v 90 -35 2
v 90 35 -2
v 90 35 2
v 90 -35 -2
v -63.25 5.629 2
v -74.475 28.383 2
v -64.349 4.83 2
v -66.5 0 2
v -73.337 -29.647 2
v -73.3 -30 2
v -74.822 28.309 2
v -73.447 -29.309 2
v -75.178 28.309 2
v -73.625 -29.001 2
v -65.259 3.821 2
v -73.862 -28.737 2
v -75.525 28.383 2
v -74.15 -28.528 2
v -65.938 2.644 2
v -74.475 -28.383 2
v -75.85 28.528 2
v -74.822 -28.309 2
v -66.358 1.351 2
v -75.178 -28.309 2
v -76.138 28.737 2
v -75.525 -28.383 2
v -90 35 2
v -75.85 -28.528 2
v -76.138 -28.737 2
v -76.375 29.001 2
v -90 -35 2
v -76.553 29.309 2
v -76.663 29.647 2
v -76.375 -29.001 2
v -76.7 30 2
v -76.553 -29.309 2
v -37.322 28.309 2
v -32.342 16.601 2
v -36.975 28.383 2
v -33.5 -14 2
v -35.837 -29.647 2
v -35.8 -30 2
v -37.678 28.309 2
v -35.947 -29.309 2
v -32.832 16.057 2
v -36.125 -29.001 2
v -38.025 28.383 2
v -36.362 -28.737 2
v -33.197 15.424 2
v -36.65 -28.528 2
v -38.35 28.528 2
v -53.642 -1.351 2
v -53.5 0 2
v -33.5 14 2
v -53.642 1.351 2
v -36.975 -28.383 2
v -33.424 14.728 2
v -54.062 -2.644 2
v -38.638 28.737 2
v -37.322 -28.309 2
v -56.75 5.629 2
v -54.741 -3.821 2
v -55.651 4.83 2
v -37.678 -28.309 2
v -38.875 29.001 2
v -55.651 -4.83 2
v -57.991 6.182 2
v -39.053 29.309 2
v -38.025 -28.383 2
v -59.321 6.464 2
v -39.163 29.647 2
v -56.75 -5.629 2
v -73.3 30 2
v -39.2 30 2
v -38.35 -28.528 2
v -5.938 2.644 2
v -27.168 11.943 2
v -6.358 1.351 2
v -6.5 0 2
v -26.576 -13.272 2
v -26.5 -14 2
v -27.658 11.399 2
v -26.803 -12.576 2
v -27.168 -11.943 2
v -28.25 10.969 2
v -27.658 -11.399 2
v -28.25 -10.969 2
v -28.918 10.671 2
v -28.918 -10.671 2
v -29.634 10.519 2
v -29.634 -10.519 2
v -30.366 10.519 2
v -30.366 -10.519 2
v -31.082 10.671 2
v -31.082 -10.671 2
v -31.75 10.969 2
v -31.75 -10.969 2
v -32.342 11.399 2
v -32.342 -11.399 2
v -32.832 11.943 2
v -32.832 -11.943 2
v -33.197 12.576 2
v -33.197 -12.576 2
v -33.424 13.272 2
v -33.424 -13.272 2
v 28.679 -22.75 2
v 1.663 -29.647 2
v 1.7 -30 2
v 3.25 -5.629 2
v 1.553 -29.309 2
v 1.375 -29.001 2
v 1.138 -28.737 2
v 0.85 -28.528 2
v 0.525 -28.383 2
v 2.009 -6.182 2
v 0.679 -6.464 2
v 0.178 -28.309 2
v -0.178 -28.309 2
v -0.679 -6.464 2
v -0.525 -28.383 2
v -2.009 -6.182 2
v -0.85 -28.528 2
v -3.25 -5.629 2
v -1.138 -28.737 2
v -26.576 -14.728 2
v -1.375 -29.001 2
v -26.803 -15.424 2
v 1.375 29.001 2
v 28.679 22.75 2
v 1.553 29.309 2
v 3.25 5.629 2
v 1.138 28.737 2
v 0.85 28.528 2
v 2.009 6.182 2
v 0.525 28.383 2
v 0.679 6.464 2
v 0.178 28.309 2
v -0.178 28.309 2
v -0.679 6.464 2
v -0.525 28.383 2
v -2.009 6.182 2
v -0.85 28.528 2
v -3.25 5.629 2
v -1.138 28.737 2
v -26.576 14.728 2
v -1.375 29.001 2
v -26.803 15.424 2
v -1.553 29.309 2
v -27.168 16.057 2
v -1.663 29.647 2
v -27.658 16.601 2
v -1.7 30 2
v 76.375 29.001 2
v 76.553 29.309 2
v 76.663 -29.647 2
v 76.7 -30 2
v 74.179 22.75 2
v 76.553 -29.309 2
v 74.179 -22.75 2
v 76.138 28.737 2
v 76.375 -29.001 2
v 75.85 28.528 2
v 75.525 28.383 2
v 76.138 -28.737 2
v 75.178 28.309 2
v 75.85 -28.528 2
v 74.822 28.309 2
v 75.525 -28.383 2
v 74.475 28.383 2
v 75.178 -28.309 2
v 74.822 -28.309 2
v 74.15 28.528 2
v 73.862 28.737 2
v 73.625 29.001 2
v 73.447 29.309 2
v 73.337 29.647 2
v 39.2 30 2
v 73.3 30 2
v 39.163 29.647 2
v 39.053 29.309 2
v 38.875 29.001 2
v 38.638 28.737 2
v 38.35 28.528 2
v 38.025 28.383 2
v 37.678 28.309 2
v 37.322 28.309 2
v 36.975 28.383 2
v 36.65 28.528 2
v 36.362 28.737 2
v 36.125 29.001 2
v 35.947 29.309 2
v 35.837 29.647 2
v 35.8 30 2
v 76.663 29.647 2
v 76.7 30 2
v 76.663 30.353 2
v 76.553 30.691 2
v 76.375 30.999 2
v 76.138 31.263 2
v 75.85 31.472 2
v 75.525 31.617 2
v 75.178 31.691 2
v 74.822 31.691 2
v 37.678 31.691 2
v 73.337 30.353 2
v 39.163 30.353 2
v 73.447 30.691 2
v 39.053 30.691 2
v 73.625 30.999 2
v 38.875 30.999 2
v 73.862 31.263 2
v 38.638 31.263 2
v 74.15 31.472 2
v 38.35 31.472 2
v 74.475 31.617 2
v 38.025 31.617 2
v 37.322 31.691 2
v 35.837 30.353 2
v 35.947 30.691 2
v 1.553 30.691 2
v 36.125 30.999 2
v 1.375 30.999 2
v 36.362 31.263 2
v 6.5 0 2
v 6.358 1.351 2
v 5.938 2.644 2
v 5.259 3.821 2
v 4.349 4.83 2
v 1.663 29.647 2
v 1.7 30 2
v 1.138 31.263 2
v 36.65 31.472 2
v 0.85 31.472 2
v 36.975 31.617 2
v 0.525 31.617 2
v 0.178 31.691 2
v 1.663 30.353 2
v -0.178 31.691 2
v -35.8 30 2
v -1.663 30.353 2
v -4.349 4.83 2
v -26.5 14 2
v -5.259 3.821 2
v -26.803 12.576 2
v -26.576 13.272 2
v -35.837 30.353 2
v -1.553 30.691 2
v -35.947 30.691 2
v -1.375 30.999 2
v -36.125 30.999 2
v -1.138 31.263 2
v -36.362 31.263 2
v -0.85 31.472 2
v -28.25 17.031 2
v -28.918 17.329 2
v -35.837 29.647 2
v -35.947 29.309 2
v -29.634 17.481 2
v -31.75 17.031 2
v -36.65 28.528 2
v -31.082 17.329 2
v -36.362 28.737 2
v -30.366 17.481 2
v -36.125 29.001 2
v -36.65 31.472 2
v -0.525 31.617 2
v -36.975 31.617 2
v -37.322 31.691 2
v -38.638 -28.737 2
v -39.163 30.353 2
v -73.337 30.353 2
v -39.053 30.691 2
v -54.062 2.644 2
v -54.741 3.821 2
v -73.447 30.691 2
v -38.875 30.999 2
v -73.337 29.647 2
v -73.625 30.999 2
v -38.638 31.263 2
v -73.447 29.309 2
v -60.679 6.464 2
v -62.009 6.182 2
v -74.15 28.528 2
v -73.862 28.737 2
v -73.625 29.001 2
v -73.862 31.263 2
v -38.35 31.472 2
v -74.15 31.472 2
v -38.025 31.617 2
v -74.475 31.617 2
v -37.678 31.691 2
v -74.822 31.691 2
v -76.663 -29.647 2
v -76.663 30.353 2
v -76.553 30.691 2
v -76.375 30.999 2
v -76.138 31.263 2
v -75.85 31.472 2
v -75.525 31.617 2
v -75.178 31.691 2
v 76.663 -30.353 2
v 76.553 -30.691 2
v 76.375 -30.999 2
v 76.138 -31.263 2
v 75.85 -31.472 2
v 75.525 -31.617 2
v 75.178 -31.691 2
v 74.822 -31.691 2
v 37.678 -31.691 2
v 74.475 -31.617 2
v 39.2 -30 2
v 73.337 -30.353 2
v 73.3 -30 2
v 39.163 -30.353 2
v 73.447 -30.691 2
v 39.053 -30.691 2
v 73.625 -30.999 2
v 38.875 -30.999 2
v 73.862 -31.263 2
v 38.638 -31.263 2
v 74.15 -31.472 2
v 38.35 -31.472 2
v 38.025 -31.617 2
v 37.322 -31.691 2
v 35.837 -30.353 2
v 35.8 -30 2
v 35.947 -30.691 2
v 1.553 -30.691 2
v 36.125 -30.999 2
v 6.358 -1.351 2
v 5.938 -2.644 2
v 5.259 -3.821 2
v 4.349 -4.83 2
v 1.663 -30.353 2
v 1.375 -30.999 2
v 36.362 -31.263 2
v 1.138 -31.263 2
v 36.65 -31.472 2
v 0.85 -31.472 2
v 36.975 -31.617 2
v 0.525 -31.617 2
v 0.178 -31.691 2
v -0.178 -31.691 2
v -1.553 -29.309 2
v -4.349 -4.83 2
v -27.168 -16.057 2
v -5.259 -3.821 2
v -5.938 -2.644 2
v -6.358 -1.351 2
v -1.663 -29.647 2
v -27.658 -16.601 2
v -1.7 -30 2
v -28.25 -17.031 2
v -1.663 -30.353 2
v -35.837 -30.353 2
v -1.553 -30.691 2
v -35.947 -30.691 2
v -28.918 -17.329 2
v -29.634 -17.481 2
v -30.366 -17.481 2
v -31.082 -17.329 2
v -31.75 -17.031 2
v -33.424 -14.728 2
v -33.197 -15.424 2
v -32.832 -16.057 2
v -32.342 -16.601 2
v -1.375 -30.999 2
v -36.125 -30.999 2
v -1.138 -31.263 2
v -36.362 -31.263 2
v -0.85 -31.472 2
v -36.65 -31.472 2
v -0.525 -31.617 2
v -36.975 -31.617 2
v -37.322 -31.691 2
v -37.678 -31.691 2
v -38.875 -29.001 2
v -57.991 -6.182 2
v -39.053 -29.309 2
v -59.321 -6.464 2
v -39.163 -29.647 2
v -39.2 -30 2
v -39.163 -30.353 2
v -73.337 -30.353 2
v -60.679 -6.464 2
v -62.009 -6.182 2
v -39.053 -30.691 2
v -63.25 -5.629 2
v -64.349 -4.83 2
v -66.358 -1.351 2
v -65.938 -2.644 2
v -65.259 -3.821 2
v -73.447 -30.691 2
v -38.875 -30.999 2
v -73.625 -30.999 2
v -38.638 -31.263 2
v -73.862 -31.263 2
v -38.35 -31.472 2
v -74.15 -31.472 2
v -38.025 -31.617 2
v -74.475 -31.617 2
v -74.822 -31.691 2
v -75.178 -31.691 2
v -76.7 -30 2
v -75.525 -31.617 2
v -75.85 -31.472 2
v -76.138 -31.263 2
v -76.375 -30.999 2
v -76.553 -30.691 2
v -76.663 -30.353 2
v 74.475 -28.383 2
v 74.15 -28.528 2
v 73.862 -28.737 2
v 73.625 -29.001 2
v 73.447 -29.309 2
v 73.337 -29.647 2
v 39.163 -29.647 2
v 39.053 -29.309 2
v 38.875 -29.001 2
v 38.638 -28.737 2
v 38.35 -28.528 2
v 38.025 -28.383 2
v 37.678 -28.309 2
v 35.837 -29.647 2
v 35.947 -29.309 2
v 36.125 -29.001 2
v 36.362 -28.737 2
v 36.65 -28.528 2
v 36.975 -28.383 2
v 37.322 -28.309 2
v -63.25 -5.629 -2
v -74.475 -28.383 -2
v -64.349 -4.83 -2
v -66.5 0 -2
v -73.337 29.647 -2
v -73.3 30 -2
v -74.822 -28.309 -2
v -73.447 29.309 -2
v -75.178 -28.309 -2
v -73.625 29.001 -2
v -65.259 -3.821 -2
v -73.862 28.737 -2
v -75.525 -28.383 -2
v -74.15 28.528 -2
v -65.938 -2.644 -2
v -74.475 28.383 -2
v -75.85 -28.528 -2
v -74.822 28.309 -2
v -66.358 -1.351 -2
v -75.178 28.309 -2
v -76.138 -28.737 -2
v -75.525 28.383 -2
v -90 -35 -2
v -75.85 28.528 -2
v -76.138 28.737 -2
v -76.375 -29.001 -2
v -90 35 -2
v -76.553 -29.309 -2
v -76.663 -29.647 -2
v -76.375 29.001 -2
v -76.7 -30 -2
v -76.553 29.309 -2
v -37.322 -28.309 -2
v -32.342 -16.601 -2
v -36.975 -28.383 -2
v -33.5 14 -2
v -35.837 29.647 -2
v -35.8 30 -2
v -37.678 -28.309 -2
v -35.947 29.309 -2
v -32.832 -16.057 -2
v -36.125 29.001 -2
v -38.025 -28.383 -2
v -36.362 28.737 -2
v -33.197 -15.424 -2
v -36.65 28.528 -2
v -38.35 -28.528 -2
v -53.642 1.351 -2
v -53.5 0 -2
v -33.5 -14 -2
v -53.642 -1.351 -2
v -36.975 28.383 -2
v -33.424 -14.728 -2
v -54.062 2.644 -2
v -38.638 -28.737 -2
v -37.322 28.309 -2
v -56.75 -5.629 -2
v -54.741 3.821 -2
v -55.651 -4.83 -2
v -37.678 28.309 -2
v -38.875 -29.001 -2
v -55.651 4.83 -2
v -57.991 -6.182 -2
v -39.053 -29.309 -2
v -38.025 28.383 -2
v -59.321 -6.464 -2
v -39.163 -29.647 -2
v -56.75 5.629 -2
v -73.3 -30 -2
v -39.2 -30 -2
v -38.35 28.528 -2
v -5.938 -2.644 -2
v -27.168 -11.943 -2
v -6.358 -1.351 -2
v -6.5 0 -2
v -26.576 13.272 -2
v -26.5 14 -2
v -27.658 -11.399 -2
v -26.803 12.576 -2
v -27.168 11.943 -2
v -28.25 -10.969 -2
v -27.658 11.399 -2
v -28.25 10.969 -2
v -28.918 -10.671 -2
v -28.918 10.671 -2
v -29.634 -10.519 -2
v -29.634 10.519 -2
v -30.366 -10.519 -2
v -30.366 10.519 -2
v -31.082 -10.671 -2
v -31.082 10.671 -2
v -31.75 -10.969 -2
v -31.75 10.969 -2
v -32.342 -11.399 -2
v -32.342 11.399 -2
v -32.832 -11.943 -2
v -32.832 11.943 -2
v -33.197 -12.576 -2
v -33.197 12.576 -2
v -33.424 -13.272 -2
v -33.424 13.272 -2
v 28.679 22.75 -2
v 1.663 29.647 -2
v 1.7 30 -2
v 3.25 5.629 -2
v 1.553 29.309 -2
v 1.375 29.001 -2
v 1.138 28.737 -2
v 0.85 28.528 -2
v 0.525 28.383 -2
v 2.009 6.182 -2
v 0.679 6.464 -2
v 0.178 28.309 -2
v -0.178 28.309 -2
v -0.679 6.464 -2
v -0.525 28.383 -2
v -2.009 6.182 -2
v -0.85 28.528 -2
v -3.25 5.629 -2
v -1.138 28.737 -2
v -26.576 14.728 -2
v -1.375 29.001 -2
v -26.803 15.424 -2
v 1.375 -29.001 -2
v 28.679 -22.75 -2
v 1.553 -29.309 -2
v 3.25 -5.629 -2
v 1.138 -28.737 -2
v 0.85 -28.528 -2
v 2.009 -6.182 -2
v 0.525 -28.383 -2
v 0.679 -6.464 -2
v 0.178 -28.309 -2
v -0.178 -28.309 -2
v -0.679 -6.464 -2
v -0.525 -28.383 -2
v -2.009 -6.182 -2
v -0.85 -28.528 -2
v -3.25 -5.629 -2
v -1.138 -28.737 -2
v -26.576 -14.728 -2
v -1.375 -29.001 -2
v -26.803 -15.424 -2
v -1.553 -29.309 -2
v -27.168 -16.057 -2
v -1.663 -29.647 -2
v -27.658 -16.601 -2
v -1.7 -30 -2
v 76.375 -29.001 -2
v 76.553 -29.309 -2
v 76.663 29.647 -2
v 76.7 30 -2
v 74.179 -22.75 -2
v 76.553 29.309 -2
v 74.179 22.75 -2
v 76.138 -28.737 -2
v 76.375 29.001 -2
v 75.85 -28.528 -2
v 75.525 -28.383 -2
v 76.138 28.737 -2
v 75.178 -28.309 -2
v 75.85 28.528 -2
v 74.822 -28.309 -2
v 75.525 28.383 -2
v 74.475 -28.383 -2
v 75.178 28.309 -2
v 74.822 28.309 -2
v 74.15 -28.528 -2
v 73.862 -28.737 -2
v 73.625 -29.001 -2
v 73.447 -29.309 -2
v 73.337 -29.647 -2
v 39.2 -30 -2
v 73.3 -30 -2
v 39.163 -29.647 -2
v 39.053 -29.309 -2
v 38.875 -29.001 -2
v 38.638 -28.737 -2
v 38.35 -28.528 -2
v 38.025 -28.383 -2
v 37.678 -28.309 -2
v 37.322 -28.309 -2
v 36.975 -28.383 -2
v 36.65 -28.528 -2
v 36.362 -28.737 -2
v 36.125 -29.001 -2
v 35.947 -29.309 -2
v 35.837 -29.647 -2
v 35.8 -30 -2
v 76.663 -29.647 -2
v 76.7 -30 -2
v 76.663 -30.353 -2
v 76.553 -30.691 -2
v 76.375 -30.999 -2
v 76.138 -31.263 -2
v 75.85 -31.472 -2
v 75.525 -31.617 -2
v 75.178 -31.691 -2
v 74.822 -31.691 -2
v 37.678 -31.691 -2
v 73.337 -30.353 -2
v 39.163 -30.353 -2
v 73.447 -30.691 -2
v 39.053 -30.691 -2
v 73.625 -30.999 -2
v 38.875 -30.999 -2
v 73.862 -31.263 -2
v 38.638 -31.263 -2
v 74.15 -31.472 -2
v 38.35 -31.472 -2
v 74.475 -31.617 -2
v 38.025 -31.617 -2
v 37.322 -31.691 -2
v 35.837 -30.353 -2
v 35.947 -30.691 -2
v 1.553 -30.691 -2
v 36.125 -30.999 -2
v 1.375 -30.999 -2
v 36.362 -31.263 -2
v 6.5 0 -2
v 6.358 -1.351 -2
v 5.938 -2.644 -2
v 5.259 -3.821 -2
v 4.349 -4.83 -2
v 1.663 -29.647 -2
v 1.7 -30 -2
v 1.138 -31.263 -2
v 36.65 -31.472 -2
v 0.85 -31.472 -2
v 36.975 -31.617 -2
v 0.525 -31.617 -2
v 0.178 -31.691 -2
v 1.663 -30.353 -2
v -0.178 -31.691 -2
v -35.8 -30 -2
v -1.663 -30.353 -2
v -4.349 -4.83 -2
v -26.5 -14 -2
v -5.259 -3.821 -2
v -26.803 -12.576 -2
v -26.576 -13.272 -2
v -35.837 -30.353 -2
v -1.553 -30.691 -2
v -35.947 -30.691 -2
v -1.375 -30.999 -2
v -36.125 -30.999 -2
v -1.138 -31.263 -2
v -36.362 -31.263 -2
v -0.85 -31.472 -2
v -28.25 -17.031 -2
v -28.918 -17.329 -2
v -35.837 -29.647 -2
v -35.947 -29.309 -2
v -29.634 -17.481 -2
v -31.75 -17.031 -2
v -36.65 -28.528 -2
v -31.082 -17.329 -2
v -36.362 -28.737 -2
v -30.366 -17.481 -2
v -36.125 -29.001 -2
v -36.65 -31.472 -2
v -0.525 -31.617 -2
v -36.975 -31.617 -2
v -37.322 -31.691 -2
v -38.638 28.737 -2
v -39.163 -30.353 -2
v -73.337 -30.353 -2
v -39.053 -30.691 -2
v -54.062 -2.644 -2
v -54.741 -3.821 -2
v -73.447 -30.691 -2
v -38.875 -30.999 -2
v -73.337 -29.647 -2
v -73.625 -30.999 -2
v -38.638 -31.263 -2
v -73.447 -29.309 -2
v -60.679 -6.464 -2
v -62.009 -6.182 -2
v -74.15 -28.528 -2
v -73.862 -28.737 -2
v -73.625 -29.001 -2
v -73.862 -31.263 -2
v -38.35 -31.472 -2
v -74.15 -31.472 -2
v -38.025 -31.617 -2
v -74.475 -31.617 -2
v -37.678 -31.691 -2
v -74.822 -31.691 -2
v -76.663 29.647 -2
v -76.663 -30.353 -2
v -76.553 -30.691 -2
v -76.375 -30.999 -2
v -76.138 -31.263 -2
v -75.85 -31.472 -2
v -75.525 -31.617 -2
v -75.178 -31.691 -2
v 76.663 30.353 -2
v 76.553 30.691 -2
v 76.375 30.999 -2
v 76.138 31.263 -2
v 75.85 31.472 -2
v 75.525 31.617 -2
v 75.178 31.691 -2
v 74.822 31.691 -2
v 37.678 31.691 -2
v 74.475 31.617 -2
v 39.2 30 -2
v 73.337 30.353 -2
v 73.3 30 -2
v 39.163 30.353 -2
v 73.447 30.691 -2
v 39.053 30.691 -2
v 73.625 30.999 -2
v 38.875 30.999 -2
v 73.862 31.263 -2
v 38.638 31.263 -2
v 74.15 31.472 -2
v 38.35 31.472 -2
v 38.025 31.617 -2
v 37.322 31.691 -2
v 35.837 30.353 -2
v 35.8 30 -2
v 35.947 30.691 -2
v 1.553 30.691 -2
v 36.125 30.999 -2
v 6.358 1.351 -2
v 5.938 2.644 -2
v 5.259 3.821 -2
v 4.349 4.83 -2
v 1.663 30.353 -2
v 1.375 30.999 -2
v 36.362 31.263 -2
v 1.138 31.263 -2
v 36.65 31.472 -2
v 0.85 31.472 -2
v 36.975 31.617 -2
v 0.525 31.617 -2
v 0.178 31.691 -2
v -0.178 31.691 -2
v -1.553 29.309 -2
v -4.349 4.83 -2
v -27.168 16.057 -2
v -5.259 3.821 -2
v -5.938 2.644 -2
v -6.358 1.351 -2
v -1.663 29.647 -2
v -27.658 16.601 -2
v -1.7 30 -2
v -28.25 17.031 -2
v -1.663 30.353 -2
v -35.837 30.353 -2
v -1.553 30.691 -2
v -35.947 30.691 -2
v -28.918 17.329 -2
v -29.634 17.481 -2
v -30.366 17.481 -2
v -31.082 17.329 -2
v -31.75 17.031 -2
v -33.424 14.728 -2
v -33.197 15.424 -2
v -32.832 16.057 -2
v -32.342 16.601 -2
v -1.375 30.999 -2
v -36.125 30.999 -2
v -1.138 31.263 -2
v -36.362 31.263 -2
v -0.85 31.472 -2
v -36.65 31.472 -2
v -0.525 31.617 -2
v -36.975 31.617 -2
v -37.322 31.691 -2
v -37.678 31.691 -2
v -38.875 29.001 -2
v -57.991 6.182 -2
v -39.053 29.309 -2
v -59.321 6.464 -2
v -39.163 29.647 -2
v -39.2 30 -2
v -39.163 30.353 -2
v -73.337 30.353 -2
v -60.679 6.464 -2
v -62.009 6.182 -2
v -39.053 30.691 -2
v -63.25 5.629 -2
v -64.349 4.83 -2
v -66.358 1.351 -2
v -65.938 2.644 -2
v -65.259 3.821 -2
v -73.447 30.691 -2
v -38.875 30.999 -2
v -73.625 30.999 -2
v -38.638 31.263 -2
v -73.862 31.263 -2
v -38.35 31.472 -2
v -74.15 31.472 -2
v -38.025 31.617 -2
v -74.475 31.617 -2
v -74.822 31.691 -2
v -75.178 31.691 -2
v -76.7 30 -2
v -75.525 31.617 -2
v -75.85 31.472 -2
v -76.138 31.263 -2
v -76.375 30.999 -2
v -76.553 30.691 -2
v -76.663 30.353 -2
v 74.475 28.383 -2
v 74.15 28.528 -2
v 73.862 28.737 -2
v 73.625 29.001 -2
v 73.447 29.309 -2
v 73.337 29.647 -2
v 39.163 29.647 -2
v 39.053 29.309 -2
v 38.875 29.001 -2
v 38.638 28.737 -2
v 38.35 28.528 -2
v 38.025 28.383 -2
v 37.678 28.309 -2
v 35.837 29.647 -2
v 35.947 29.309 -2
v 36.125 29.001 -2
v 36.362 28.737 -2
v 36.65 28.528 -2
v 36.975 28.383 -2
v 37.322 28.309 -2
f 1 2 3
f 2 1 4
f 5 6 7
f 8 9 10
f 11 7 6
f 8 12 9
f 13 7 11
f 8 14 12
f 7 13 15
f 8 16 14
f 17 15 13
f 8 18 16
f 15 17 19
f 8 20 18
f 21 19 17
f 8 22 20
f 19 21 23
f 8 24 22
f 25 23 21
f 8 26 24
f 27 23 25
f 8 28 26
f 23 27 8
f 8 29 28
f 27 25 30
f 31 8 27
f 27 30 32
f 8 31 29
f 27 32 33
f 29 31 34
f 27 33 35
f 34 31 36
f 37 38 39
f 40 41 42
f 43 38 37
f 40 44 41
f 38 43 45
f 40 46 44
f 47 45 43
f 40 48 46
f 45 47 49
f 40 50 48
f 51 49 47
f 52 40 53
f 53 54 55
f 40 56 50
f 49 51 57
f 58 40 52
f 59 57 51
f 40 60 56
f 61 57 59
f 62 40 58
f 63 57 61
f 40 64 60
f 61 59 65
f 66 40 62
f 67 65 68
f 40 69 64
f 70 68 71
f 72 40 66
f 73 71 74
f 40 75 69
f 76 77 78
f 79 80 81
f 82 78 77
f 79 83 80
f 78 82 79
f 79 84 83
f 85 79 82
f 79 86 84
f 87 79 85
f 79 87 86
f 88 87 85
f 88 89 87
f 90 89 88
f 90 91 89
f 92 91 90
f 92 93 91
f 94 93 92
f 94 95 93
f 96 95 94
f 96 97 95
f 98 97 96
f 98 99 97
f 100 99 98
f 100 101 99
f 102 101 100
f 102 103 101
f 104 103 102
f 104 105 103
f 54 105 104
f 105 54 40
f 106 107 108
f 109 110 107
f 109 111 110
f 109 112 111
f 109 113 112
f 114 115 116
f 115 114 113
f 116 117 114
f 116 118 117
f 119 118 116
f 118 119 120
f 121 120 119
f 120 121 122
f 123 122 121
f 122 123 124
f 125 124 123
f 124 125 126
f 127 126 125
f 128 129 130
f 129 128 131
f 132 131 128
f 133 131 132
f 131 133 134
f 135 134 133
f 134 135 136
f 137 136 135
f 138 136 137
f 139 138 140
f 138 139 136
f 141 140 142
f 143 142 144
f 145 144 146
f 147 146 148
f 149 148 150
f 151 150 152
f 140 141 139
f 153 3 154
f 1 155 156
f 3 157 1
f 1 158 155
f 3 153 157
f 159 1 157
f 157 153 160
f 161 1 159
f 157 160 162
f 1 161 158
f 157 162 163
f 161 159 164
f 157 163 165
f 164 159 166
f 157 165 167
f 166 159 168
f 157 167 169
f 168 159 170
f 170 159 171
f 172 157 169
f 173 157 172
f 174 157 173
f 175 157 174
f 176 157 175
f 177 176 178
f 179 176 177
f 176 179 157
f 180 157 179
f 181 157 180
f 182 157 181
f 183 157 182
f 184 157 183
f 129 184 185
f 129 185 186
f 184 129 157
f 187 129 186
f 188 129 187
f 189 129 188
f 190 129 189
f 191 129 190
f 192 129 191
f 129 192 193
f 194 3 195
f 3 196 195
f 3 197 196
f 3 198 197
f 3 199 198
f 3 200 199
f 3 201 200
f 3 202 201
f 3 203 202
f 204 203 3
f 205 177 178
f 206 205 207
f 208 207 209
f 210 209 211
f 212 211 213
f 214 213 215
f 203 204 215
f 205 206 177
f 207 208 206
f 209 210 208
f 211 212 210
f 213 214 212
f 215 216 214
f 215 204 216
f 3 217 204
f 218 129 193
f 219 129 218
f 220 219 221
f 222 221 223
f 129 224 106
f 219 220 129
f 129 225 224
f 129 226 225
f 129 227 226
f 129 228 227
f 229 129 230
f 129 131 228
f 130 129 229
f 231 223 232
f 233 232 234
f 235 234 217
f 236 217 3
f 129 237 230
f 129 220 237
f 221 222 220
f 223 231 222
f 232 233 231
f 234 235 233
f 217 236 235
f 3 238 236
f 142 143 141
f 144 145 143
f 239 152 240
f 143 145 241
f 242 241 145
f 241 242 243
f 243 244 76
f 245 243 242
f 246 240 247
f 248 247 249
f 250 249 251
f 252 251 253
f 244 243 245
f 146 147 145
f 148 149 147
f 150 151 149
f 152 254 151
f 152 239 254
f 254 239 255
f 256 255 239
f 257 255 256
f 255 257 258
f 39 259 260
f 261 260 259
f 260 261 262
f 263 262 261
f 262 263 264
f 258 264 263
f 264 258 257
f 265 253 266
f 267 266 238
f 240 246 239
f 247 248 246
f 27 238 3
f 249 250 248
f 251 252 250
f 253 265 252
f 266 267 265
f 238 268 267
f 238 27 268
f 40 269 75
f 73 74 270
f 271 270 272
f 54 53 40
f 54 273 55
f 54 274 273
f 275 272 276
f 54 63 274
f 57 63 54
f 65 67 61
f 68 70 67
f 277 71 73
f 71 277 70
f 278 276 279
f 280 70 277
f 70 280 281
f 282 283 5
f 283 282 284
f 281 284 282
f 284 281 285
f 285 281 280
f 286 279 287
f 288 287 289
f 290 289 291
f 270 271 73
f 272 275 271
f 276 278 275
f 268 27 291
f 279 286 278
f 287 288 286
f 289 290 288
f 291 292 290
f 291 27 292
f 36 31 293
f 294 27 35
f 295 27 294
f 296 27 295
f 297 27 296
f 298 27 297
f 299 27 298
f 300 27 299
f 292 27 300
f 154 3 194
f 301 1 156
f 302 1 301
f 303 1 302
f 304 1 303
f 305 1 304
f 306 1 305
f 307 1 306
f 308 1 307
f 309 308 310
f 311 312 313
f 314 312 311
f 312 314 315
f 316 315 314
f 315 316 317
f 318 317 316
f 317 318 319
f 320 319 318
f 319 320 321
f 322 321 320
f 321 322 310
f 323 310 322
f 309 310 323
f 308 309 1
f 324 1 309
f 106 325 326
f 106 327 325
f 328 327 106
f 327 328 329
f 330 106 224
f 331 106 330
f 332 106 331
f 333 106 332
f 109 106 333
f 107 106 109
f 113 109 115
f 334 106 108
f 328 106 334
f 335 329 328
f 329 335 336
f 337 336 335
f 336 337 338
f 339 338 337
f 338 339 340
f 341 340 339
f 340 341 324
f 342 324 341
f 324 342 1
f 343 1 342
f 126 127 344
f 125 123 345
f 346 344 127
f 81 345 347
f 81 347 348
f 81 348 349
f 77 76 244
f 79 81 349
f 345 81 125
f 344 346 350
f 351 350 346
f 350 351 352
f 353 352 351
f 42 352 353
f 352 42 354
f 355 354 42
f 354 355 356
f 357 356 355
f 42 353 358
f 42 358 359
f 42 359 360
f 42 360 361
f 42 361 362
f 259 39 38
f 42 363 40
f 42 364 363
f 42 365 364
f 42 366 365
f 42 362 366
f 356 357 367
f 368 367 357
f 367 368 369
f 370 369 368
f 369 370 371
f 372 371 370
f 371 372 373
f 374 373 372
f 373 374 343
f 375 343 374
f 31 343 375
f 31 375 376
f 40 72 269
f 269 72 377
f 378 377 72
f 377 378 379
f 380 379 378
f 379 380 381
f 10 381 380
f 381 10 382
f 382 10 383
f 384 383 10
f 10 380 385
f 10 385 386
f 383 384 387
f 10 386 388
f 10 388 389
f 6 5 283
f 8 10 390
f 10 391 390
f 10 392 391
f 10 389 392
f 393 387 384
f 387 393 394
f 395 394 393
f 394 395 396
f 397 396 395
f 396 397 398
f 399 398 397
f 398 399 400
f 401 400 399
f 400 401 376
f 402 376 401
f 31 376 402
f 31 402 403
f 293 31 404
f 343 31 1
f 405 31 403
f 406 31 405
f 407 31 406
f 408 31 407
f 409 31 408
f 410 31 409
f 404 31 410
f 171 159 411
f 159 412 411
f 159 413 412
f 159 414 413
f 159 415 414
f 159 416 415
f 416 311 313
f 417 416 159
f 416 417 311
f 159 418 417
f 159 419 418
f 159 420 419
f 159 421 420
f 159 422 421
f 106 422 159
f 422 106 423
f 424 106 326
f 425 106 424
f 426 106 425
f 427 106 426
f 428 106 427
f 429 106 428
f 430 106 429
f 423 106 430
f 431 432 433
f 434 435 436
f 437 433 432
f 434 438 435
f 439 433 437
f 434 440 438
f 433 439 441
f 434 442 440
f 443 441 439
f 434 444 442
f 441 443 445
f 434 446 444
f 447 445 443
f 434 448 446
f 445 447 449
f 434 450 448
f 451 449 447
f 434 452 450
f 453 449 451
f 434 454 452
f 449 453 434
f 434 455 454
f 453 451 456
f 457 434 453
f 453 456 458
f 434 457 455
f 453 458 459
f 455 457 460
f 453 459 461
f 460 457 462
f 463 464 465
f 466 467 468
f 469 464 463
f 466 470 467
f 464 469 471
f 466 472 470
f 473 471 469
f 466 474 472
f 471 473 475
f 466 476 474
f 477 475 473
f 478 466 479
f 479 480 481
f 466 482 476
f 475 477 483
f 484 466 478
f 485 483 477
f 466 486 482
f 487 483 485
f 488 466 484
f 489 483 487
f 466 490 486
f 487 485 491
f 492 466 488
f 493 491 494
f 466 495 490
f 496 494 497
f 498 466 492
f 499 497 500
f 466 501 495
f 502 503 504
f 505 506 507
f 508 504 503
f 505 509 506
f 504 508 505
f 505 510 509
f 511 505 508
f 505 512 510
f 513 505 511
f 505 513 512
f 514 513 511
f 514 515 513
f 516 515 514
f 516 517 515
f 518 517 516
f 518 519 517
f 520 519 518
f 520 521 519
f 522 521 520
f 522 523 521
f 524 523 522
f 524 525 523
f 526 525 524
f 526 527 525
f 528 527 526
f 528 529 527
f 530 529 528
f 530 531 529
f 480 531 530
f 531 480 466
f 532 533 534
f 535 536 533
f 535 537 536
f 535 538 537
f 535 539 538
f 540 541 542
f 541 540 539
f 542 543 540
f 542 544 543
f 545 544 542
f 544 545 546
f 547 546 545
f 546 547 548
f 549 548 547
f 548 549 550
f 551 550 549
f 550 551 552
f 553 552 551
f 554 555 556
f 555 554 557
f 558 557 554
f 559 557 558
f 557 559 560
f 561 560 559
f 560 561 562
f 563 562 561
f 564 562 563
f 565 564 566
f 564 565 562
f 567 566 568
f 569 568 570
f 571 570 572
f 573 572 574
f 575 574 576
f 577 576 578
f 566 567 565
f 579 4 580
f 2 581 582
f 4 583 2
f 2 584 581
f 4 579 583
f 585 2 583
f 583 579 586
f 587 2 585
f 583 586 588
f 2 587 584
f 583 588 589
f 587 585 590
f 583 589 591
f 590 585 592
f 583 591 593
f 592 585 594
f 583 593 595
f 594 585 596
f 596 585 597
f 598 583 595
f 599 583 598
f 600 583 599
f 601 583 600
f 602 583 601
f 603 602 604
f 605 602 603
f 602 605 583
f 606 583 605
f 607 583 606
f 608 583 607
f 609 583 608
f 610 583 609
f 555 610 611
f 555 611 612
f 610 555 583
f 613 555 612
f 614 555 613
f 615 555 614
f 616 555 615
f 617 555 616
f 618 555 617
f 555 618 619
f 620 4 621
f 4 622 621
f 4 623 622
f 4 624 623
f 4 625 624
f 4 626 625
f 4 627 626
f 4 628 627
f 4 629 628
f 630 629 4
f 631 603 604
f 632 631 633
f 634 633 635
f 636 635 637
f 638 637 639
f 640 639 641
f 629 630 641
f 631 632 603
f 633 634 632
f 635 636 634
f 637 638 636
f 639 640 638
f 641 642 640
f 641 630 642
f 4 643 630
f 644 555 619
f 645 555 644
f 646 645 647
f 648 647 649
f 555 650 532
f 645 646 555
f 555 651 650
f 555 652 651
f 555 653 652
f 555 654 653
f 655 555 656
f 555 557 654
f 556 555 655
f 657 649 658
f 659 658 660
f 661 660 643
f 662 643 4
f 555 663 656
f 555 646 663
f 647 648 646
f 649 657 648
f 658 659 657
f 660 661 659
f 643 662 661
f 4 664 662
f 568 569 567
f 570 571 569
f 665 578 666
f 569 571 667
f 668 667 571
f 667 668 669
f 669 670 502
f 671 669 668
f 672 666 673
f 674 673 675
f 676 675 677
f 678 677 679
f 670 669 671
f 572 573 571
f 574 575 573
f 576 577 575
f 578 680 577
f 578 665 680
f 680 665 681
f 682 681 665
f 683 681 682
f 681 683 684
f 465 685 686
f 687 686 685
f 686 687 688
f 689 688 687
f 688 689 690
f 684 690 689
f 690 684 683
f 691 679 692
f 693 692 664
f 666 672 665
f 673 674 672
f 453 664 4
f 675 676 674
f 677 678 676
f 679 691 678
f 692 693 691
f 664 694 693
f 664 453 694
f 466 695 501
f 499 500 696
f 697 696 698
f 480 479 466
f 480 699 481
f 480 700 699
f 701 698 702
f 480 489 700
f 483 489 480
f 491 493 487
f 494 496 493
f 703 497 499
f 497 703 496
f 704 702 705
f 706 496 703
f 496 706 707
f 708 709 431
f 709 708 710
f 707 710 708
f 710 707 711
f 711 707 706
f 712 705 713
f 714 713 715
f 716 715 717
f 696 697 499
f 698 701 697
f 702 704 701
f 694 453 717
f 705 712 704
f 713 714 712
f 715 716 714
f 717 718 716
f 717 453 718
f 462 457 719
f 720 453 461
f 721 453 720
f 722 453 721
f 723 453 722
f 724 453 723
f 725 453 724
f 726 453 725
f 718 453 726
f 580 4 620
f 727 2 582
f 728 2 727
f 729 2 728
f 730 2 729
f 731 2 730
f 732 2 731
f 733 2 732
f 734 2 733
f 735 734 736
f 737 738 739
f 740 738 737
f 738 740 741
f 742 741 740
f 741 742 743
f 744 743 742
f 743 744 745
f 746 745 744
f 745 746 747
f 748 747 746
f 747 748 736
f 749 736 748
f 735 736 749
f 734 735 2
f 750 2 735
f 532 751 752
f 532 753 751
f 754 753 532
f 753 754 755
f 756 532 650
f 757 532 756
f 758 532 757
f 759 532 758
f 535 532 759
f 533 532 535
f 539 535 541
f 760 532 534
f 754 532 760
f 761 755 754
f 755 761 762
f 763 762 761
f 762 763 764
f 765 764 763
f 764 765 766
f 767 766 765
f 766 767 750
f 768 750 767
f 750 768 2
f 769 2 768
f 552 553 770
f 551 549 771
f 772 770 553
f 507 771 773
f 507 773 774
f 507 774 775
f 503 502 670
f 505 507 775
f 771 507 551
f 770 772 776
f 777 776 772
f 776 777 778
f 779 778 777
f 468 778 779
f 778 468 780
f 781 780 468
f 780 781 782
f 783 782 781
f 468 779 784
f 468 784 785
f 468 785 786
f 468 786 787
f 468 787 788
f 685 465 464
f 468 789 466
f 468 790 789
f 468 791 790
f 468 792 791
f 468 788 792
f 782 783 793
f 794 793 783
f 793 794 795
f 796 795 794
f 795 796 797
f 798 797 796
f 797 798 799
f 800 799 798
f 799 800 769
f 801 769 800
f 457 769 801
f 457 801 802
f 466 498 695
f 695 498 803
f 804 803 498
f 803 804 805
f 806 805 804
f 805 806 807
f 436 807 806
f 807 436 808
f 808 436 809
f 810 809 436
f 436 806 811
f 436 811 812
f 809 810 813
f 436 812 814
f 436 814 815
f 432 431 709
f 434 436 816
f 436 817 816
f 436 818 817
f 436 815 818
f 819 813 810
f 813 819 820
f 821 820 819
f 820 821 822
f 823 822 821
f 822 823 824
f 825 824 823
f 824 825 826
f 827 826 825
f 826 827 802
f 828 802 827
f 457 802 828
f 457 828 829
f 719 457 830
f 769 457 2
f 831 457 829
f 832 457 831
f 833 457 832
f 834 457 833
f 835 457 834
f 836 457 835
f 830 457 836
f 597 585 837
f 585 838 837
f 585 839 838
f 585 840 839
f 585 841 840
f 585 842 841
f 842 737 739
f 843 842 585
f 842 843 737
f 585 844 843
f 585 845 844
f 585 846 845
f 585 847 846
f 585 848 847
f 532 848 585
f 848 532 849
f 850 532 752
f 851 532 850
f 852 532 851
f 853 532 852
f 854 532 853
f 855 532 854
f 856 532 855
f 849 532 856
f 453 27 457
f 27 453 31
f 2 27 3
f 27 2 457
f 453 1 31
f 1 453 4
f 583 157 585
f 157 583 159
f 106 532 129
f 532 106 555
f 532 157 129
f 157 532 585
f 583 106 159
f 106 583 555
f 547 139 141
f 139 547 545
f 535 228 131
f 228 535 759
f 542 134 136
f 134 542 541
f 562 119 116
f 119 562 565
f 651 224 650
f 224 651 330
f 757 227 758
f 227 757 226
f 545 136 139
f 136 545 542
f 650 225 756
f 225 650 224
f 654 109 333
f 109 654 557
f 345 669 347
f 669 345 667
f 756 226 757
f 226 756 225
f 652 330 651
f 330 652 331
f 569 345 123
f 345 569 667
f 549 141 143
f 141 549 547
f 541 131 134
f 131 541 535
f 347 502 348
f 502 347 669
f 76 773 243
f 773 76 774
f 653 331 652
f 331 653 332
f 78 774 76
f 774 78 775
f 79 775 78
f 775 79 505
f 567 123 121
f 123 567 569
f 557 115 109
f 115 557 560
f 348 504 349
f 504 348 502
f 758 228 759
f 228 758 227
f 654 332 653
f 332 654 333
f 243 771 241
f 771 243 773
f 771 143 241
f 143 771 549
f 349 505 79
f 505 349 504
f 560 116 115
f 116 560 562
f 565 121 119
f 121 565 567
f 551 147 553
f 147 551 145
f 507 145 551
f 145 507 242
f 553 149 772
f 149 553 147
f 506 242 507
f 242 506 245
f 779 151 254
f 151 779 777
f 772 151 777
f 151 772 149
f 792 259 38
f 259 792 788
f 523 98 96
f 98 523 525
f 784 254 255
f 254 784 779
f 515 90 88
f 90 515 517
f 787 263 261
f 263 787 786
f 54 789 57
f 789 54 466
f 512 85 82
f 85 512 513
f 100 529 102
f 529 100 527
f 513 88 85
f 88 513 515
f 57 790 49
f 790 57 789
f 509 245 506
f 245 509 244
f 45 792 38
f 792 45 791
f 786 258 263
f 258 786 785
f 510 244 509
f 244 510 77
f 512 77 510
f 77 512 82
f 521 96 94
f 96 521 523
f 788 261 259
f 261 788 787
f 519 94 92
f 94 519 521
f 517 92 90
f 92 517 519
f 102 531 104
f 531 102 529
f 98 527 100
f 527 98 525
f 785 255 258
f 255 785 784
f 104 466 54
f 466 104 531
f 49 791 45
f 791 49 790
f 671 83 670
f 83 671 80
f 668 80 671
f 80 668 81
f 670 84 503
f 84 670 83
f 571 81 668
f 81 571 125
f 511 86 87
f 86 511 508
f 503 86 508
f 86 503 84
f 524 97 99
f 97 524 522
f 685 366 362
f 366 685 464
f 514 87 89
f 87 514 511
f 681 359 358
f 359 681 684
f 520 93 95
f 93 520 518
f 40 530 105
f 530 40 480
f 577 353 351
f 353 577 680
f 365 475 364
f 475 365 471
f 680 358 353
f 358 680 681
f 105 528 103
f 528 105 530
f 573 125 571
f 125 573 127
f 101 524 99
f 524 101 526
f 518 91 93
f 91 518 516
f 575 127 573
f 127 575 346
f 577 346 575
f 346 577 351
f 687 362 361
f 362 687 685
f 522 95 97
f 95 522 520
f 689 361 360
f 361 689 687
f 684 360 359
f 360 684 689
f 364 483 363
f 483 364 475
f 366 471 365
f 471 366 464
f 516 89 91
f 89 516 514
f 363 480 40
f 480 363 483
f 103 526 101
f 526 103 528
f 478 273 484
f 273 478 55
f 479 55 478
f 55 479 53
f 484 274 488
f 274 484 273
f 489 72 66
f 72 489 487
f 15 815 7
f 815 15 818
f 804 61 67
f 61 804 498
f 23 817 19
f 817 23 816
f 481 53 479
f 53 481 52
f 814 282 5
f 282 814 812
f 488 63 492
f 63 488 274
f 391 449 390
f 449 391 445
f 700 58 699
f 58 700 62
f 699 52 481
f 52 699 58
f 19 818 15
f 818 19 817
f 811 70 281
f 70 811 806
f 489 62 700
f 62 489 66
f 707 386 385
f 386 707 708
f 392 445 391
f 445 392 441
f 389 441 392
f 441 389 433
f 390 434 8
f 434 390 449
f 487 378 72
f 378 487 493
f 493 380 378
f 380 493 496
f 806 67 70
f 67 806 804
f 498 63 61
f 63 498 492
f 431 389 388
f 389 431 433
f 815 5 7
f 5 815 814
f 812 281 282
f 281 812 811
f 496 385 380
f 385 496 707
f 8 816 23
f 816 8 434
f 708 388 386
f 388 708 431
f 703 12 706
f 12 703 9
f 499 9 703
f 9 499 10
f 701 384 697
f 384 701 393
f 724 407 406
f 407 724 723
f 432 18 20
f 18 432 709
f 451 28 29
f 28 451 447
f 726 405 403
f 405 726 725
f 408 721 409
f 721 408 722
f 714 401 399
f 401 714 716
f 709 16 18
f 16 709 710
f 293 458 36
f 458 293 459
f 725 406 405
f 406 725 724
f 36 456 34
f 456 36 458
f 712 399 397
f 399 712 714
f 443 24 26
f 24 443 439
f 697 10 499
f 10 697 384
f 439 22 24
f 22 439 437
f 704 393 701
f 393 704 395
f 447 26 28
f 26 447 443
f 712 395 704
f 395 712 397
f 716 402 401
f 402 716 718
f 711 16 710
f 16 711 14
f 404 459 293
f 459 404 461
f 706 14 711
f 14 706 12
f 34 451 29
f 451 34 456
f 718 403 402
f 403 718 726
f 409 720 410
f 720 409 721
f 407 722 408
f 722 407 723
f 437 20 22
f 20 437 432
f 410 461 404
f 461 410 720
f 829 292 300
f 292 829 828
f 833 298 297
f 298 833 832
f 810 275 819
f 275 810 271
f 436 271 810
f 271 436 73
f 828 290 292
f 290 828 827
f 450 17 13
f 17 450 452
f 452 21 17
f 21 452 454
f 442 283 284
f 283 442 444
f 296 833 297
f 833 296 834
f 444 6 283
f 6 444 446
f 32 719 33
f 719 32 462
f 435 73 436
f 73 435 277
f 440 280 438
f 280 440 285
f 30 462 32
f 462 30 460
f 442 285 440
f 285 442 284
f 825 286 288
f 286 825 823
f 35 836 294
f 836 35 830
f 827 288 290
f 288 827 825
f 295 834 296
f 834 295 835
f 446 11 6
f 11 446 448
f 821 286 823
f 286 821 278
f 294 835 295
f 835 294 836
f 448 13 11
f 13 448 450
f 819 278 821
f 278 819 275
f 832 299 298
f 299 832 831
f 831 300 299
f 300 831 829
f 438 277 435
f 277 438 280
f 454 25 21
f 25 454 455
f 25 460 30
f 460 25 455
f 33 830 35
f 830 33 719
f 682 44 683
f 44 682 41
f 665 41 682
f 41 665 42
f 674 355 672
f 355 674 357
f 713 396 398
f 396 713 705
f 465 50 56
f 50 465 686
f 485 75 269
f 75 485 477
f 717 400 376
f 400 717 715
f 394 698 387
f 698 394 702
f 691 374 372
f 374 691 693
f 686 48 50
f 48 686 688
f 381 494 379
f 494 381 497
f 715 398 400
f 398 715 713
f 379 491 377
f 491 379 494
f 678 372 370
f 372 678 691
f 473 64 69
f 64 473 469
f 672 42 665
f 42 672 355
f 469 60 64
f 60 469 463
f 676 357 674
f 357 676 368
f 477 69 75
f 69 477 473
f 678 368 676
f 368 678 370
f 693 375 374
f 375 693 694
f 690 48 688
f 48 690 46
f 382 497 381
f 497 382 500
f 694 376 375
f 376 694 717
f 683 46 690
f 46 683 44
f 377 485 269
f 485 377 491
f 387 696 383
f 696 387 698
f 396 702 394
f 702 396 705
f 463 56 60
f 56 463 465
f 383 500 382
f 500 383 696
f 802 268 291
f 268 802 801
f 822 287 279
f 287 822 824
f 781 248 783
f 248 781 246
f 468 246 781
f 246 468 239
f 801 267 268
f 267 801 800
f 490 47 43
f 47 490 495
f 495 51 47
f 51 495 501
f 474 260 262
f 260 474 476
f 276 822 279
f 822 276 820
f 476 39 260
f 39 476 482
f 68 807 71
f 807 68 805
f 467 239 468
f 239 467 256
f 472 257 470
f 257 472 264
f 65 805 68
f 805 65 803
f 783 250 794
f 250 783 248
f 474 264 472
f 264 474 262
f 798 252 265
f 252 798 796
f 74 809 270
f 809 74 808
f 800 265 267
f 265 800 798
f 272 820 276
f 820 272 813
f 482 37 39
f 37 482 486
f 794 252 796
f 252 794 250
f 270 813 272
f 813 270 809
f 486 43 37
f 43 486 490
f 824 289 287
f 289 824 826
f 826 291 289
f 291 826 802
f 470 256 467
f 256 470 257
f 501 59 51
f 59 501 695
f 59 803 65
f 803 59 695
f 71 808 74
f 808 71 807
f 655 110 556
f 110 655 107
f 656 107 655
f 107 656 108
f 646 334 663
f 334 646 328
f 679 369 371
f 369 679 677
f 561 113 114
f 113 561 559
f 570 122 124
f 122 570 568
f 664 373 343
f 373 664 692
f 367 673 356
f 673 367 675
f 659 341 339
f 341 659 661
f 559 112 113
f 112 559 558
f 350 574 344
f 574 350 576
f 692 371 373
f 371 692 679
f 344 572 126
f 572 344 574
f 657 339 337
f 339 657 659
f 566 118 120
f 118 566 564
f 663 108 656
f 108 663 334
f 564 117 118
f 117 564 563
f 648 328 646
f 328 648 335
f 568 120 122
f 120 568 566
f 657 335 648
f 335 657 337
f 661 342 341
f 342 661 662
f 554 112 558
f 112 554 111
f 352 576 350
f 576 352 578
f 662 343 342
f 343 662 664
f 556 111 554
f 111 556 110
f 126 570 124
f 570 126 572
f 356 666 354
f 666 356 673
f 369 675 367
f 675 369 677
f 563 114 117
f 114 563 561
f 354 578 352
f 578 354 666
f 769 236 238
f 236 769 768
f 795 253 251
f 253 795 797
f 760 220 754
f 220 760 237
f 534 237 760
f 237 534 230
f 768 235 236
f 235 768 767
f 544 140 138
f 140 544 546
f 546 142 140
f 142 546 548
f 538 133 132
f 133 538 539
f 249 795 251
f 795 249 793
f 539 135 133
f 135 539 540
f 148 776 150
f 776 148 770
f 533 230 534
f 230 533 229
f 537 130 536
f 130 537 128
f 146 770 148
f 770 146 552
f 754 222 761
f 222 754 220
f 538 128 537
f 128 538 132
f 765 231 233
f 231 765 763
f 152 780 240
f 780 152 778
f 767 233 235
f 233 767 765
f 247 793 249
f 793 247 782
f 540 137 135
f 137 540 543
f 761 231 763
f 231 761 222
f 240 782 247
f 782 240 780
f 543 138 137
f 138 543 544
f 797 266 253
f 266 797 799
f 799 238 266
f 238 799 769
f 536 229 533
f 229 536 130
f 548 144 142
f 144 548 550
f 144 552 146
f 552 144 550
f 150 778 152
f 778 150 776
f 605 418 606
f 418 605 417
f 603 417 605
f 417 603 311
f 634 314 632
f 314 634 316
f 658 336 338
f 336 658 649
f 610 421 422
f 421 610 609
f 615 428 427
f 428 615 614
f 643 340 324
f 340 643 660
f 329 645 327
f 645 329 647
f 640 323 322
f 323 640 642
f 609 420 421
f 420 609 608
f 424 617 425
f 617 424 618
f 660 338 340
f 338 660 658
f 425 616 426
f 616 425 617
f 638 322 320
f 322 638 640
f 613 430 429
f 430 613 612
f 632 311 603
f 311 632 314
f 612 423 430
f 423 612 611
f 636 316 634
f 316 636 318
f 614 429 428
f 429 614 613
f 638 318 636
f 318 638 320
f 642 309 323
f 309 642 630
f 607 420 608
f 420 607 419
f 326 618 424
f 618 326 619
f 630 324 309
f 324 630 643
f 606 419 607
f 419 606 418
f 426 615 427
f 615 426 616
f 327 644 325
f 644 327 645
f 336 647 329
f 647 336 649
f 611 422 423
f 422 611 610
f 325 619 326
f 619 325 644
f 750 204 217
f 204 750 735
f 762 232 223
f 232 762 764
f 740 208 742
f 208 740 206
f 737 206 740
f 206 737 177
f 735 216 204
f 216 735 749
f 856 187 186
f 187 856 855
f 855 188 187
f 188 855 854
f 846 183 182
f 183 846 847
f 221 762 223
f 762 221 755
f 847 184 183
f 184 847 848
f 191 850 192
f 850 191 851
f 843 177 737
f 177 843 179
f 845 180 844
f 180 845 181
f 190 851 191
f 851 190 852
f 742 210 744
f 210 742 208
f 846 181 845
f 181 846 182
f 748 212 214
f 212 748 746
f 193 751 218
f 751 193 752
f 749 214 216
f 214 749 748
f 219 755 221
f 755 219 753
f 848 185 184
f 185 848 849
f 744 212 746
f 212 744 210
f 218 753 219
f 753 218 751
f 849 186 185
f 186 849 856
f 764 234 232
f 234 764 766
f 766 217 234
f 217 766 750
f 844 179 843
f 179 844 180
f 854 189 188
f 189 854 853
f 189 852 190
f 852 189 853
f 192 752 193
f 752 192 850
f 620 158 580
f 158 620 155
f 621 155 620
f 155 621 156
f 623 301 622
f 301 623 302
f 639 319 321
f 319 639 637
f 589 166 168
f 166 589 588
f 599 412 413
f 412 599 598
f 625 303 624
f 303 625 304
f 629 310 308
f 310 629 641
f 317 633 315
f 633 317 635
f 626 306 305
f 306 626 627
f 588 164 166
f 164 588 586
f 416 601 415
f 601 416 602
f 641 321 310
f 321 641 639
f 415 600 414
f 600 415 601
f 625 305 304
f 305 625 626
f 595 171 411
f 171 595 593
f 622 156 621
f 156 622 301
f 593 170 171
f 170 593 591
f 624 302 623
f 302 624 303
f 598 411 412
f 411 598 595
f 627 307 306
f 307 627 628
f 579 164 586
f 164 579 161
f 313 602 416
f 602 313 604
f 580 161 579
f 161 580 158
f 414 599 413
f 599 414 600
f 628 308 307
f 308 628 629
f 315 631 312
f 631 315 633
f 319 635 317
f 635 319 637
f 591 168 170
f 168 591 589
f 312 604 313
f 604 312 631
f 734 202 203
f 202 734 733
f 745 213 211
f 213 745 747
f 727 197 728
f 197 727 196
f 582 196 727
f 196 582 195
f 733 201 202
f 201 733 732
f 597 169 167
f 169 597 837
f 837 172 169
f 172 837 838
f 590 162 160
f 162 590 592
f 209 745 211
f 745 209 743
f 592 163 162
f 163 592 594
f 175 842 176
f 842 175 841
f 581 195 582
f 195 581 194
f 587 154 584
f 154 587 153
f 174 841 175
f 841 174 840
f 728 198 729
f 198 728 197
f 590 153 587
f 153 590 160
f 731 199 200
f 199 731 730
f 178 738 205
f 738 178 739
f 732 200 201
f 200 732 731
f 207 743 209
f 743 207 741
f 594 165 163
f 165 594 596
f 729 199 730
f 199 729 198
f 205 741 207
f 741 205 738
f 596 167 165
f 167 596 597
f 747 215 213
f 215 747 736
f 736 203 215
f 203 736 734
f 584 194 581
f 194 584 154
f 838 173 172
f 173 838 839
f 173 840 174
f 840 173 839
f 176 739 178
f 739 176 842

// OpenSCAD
//========================================//
// filastruder_electronics_enclosure.scad //
//========================================//
// Designed by Kyle Seigler and released  //
// under the MIT license, available at:   //
// https://opensource.org/licenses/MIT    //
//========================================//

/*The MIT License (MIT)

Copyright (c) 2016 Kyle Seigler

Permission is hereby granted, free of charge, to any person obtaining a copy of this software and associated documentation files (the "Software"), to deal in the Software without restriction, including without limitation the rights to use, copy, modify, merge, publish, distribute, sublicense, and/or sell copies of the Software, and to permit persons to whom the Software is furnished to do so, subject to the following conditions:

The above copyright notice and this permission notice shall be included in all copies or substantial portions of the Software.

THE SOFTWARE IS PROVIDED "AS IS", WITHOUT WARRANTY OF ANY KIND, EXPRESS OR IMPLIED, INCLUDING BUT NOT LIMITED TO THE WARRANTIES OF MERCHANTABILITY, FITNESS FOR A PARTICULAR PURPOSE AND NONINFRINGEMENT. IN NO EVENT SHALL THE AUTHORS OR COPYRIGHT HOLDERS BE LIABLE FOR ANY CLAIM, DAMAGES OR OTHER LIABILITY, WHETHER IN AN ACTION OF CONTRACT, TORT OR OTHERWISE, ARISING FROM, OUT OF OR IN CONNECTION WITH THE SOFTWARE OR THE USE OR OTHER DEALINGS IN THE SOFTWARE.
*/

// all dimensions in mm
// designed for M5 bolts and M5 nuts

$fn=30; // 200 default

// Dimensional settings (all measurements in mm)
// WARNING: Some of these scale, some don't (this is a WIP).
// Default values in comments--these should work properly.

faceplateThickness=   4;    // 4mm default
faceplateWidth=       180;  // 180mm default
faceplateHeight=      70;   // 80mm default
sestosWidth=          45.5; // 45mm measured
sestosHeight=         45.5; // 45mm measured
powerSwitchDiameter=  13;   // 12mm measured
auxSwitchDiameter=    7;  // 6.5mm measured
fastenerHoleDiameter= 3.4;  // 3.4mm seems to work best

// Full component
difference(){
  faceplate();
  faceplateFastenerHoles();
}

// Modules
module faceplate(){
  difference(){
    // Main faceplate geometry
    cube(center=true,[faceplateWidth,faceplateHeight,faceplateThickness]);
    // Sestos PID opening
    translate([faceplateWidth/3.5,0,0]){
      cube(center=true,[sestosWidth,sestosHeight,faceplateThickness+0.1]);
    }
    // Motor power switch opening
    translate([0,0,0]){
      cylinder(center=true,h=faceplateThickness+0.01,r=powerSwitchDiameter/2);
    }
    // Aux 1 switch opening
    translate([-faceplateWidth/6,faceplateHeight/5,0]){
      cylinder(center=true,h=faceplateThickness+0.01,r=auxSwitchDiameter/2);
    }
    // Aux 2 switch opening
    translate([-faceplateWidth/6,-faceplateHeight/5,0]){
      cylinder(center=true,h=faceplateThickness+0.01,r=auxSwitchDiameter/2);
    }
    // Main power switch opening
    translate([-faceplateWidth/3,0,0]){
      cylinder(center=true,h=faceplateThickness+0.01,r=powerSwitchDiameter/2);
    }

  }
}
module faceplateFastenerHoles(){
  for(x=[-75,-37.5,0,37.5,75]){
    for(y=[-30,30]){
      translate([x,y,0]){
        cylinder(center=true,h=faceplateThickness+0.01,r=fastenerHoleDiameter/2);
      }
    }
  }
}
